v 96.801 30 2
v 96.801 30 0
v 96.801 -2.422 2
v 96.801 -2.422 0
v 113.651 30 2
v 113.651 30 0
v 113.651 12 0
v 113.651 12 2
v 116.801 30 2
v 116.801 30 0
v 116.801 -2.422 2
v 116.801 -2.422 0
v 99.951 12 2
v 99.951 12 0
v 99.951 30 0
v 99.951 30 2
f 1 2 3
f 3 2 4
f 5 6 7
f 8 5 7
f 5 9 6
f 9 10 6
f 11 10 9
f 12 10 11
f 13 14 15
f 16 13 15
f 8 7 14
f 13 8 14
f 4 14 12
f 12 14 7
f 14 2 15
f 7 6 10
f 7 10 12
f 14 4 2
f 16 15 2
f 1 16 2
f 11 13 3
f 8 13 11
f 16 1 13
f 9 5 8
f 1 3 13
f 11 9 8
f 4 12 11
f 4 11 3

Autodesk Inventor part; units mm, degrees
ref_plane "YZ Plane" through (0, 0, 0) normal (1, 0, 0) x (0, 1, 0)
ref_plane "XZ Plane" through (0, 0, 0) normal (0, 1, 0) x (-1, 0, 0)
ref_plane "XY Plane" through (0, 0, 0) normal (0, 0, 1) x (1, 0, 0)
sketch "Sketch1" plane through (0, 0, 0) normal (0, 0, 1) x (1, 0, 0)
  line L0 (113.6513, 30) -> (113.6513, 12)
  line L1 (113.6513, 12) -> (99.9513, 12)
  line L2 (99.9513, 12) -> (99.9513, 30)
  line L3 (99.9513, 30) -> (99.8013, 30)
  line L4 (99.8013, -3.4599) -> (99.8013, 30)
  line L5 (113.8013, -3.4599) -> (99.8013, -3.4599)
  line L6 (113.8013, 30) -> (113.8013, -3.4599)
  line L7 (113.8013, 30) -> (113.6513, 30)
  line L8 (96.8013, 30) -> (96.8013, -2.4219)
  line L9 (116.8013, 30) -> (116.8013, -2.4219)
  line L10 (116.8013, -2.4219) -> (96.8013, -2.4219)
  line L11 (96.8013, 30) -> (99.8013, 30)
  line L12 (113.8013, 30) -> (116.8013, 30)
  point P0 (0, 0)
  point P1 (99.8013, -2.4219)
  point P2 (113.8013, -2.4219)
extrude "Extrusion1" add sketch "Sketch1" along normal blind 2 contours L7 L6 L10 L4 L3 L2 L1 L0 | L12 L9 L10 L6 | L10 L8 L11 L4
equation "\"BendRadius\" = Thickness"
equation "\"BendReliefWidth\" = Thickness"
equation "\"BendReliefDepth\" = 0.5 * Thickness"
equation "\"CornerReliefSize\" = 4 * Thickness"
equation "\"MinimumRemnant\" = 2 * Thickness"
equation "\"TransitionRadius\" = BendRadius"
equation "\"JacobiRadiusSize\" = BendRadius"
equation "\"GapSize\" = Thickness"
equation "\"Thickness\" = 2"
properties part number "BackWheelMotorMountSpacer" material "Steel, Mild"
